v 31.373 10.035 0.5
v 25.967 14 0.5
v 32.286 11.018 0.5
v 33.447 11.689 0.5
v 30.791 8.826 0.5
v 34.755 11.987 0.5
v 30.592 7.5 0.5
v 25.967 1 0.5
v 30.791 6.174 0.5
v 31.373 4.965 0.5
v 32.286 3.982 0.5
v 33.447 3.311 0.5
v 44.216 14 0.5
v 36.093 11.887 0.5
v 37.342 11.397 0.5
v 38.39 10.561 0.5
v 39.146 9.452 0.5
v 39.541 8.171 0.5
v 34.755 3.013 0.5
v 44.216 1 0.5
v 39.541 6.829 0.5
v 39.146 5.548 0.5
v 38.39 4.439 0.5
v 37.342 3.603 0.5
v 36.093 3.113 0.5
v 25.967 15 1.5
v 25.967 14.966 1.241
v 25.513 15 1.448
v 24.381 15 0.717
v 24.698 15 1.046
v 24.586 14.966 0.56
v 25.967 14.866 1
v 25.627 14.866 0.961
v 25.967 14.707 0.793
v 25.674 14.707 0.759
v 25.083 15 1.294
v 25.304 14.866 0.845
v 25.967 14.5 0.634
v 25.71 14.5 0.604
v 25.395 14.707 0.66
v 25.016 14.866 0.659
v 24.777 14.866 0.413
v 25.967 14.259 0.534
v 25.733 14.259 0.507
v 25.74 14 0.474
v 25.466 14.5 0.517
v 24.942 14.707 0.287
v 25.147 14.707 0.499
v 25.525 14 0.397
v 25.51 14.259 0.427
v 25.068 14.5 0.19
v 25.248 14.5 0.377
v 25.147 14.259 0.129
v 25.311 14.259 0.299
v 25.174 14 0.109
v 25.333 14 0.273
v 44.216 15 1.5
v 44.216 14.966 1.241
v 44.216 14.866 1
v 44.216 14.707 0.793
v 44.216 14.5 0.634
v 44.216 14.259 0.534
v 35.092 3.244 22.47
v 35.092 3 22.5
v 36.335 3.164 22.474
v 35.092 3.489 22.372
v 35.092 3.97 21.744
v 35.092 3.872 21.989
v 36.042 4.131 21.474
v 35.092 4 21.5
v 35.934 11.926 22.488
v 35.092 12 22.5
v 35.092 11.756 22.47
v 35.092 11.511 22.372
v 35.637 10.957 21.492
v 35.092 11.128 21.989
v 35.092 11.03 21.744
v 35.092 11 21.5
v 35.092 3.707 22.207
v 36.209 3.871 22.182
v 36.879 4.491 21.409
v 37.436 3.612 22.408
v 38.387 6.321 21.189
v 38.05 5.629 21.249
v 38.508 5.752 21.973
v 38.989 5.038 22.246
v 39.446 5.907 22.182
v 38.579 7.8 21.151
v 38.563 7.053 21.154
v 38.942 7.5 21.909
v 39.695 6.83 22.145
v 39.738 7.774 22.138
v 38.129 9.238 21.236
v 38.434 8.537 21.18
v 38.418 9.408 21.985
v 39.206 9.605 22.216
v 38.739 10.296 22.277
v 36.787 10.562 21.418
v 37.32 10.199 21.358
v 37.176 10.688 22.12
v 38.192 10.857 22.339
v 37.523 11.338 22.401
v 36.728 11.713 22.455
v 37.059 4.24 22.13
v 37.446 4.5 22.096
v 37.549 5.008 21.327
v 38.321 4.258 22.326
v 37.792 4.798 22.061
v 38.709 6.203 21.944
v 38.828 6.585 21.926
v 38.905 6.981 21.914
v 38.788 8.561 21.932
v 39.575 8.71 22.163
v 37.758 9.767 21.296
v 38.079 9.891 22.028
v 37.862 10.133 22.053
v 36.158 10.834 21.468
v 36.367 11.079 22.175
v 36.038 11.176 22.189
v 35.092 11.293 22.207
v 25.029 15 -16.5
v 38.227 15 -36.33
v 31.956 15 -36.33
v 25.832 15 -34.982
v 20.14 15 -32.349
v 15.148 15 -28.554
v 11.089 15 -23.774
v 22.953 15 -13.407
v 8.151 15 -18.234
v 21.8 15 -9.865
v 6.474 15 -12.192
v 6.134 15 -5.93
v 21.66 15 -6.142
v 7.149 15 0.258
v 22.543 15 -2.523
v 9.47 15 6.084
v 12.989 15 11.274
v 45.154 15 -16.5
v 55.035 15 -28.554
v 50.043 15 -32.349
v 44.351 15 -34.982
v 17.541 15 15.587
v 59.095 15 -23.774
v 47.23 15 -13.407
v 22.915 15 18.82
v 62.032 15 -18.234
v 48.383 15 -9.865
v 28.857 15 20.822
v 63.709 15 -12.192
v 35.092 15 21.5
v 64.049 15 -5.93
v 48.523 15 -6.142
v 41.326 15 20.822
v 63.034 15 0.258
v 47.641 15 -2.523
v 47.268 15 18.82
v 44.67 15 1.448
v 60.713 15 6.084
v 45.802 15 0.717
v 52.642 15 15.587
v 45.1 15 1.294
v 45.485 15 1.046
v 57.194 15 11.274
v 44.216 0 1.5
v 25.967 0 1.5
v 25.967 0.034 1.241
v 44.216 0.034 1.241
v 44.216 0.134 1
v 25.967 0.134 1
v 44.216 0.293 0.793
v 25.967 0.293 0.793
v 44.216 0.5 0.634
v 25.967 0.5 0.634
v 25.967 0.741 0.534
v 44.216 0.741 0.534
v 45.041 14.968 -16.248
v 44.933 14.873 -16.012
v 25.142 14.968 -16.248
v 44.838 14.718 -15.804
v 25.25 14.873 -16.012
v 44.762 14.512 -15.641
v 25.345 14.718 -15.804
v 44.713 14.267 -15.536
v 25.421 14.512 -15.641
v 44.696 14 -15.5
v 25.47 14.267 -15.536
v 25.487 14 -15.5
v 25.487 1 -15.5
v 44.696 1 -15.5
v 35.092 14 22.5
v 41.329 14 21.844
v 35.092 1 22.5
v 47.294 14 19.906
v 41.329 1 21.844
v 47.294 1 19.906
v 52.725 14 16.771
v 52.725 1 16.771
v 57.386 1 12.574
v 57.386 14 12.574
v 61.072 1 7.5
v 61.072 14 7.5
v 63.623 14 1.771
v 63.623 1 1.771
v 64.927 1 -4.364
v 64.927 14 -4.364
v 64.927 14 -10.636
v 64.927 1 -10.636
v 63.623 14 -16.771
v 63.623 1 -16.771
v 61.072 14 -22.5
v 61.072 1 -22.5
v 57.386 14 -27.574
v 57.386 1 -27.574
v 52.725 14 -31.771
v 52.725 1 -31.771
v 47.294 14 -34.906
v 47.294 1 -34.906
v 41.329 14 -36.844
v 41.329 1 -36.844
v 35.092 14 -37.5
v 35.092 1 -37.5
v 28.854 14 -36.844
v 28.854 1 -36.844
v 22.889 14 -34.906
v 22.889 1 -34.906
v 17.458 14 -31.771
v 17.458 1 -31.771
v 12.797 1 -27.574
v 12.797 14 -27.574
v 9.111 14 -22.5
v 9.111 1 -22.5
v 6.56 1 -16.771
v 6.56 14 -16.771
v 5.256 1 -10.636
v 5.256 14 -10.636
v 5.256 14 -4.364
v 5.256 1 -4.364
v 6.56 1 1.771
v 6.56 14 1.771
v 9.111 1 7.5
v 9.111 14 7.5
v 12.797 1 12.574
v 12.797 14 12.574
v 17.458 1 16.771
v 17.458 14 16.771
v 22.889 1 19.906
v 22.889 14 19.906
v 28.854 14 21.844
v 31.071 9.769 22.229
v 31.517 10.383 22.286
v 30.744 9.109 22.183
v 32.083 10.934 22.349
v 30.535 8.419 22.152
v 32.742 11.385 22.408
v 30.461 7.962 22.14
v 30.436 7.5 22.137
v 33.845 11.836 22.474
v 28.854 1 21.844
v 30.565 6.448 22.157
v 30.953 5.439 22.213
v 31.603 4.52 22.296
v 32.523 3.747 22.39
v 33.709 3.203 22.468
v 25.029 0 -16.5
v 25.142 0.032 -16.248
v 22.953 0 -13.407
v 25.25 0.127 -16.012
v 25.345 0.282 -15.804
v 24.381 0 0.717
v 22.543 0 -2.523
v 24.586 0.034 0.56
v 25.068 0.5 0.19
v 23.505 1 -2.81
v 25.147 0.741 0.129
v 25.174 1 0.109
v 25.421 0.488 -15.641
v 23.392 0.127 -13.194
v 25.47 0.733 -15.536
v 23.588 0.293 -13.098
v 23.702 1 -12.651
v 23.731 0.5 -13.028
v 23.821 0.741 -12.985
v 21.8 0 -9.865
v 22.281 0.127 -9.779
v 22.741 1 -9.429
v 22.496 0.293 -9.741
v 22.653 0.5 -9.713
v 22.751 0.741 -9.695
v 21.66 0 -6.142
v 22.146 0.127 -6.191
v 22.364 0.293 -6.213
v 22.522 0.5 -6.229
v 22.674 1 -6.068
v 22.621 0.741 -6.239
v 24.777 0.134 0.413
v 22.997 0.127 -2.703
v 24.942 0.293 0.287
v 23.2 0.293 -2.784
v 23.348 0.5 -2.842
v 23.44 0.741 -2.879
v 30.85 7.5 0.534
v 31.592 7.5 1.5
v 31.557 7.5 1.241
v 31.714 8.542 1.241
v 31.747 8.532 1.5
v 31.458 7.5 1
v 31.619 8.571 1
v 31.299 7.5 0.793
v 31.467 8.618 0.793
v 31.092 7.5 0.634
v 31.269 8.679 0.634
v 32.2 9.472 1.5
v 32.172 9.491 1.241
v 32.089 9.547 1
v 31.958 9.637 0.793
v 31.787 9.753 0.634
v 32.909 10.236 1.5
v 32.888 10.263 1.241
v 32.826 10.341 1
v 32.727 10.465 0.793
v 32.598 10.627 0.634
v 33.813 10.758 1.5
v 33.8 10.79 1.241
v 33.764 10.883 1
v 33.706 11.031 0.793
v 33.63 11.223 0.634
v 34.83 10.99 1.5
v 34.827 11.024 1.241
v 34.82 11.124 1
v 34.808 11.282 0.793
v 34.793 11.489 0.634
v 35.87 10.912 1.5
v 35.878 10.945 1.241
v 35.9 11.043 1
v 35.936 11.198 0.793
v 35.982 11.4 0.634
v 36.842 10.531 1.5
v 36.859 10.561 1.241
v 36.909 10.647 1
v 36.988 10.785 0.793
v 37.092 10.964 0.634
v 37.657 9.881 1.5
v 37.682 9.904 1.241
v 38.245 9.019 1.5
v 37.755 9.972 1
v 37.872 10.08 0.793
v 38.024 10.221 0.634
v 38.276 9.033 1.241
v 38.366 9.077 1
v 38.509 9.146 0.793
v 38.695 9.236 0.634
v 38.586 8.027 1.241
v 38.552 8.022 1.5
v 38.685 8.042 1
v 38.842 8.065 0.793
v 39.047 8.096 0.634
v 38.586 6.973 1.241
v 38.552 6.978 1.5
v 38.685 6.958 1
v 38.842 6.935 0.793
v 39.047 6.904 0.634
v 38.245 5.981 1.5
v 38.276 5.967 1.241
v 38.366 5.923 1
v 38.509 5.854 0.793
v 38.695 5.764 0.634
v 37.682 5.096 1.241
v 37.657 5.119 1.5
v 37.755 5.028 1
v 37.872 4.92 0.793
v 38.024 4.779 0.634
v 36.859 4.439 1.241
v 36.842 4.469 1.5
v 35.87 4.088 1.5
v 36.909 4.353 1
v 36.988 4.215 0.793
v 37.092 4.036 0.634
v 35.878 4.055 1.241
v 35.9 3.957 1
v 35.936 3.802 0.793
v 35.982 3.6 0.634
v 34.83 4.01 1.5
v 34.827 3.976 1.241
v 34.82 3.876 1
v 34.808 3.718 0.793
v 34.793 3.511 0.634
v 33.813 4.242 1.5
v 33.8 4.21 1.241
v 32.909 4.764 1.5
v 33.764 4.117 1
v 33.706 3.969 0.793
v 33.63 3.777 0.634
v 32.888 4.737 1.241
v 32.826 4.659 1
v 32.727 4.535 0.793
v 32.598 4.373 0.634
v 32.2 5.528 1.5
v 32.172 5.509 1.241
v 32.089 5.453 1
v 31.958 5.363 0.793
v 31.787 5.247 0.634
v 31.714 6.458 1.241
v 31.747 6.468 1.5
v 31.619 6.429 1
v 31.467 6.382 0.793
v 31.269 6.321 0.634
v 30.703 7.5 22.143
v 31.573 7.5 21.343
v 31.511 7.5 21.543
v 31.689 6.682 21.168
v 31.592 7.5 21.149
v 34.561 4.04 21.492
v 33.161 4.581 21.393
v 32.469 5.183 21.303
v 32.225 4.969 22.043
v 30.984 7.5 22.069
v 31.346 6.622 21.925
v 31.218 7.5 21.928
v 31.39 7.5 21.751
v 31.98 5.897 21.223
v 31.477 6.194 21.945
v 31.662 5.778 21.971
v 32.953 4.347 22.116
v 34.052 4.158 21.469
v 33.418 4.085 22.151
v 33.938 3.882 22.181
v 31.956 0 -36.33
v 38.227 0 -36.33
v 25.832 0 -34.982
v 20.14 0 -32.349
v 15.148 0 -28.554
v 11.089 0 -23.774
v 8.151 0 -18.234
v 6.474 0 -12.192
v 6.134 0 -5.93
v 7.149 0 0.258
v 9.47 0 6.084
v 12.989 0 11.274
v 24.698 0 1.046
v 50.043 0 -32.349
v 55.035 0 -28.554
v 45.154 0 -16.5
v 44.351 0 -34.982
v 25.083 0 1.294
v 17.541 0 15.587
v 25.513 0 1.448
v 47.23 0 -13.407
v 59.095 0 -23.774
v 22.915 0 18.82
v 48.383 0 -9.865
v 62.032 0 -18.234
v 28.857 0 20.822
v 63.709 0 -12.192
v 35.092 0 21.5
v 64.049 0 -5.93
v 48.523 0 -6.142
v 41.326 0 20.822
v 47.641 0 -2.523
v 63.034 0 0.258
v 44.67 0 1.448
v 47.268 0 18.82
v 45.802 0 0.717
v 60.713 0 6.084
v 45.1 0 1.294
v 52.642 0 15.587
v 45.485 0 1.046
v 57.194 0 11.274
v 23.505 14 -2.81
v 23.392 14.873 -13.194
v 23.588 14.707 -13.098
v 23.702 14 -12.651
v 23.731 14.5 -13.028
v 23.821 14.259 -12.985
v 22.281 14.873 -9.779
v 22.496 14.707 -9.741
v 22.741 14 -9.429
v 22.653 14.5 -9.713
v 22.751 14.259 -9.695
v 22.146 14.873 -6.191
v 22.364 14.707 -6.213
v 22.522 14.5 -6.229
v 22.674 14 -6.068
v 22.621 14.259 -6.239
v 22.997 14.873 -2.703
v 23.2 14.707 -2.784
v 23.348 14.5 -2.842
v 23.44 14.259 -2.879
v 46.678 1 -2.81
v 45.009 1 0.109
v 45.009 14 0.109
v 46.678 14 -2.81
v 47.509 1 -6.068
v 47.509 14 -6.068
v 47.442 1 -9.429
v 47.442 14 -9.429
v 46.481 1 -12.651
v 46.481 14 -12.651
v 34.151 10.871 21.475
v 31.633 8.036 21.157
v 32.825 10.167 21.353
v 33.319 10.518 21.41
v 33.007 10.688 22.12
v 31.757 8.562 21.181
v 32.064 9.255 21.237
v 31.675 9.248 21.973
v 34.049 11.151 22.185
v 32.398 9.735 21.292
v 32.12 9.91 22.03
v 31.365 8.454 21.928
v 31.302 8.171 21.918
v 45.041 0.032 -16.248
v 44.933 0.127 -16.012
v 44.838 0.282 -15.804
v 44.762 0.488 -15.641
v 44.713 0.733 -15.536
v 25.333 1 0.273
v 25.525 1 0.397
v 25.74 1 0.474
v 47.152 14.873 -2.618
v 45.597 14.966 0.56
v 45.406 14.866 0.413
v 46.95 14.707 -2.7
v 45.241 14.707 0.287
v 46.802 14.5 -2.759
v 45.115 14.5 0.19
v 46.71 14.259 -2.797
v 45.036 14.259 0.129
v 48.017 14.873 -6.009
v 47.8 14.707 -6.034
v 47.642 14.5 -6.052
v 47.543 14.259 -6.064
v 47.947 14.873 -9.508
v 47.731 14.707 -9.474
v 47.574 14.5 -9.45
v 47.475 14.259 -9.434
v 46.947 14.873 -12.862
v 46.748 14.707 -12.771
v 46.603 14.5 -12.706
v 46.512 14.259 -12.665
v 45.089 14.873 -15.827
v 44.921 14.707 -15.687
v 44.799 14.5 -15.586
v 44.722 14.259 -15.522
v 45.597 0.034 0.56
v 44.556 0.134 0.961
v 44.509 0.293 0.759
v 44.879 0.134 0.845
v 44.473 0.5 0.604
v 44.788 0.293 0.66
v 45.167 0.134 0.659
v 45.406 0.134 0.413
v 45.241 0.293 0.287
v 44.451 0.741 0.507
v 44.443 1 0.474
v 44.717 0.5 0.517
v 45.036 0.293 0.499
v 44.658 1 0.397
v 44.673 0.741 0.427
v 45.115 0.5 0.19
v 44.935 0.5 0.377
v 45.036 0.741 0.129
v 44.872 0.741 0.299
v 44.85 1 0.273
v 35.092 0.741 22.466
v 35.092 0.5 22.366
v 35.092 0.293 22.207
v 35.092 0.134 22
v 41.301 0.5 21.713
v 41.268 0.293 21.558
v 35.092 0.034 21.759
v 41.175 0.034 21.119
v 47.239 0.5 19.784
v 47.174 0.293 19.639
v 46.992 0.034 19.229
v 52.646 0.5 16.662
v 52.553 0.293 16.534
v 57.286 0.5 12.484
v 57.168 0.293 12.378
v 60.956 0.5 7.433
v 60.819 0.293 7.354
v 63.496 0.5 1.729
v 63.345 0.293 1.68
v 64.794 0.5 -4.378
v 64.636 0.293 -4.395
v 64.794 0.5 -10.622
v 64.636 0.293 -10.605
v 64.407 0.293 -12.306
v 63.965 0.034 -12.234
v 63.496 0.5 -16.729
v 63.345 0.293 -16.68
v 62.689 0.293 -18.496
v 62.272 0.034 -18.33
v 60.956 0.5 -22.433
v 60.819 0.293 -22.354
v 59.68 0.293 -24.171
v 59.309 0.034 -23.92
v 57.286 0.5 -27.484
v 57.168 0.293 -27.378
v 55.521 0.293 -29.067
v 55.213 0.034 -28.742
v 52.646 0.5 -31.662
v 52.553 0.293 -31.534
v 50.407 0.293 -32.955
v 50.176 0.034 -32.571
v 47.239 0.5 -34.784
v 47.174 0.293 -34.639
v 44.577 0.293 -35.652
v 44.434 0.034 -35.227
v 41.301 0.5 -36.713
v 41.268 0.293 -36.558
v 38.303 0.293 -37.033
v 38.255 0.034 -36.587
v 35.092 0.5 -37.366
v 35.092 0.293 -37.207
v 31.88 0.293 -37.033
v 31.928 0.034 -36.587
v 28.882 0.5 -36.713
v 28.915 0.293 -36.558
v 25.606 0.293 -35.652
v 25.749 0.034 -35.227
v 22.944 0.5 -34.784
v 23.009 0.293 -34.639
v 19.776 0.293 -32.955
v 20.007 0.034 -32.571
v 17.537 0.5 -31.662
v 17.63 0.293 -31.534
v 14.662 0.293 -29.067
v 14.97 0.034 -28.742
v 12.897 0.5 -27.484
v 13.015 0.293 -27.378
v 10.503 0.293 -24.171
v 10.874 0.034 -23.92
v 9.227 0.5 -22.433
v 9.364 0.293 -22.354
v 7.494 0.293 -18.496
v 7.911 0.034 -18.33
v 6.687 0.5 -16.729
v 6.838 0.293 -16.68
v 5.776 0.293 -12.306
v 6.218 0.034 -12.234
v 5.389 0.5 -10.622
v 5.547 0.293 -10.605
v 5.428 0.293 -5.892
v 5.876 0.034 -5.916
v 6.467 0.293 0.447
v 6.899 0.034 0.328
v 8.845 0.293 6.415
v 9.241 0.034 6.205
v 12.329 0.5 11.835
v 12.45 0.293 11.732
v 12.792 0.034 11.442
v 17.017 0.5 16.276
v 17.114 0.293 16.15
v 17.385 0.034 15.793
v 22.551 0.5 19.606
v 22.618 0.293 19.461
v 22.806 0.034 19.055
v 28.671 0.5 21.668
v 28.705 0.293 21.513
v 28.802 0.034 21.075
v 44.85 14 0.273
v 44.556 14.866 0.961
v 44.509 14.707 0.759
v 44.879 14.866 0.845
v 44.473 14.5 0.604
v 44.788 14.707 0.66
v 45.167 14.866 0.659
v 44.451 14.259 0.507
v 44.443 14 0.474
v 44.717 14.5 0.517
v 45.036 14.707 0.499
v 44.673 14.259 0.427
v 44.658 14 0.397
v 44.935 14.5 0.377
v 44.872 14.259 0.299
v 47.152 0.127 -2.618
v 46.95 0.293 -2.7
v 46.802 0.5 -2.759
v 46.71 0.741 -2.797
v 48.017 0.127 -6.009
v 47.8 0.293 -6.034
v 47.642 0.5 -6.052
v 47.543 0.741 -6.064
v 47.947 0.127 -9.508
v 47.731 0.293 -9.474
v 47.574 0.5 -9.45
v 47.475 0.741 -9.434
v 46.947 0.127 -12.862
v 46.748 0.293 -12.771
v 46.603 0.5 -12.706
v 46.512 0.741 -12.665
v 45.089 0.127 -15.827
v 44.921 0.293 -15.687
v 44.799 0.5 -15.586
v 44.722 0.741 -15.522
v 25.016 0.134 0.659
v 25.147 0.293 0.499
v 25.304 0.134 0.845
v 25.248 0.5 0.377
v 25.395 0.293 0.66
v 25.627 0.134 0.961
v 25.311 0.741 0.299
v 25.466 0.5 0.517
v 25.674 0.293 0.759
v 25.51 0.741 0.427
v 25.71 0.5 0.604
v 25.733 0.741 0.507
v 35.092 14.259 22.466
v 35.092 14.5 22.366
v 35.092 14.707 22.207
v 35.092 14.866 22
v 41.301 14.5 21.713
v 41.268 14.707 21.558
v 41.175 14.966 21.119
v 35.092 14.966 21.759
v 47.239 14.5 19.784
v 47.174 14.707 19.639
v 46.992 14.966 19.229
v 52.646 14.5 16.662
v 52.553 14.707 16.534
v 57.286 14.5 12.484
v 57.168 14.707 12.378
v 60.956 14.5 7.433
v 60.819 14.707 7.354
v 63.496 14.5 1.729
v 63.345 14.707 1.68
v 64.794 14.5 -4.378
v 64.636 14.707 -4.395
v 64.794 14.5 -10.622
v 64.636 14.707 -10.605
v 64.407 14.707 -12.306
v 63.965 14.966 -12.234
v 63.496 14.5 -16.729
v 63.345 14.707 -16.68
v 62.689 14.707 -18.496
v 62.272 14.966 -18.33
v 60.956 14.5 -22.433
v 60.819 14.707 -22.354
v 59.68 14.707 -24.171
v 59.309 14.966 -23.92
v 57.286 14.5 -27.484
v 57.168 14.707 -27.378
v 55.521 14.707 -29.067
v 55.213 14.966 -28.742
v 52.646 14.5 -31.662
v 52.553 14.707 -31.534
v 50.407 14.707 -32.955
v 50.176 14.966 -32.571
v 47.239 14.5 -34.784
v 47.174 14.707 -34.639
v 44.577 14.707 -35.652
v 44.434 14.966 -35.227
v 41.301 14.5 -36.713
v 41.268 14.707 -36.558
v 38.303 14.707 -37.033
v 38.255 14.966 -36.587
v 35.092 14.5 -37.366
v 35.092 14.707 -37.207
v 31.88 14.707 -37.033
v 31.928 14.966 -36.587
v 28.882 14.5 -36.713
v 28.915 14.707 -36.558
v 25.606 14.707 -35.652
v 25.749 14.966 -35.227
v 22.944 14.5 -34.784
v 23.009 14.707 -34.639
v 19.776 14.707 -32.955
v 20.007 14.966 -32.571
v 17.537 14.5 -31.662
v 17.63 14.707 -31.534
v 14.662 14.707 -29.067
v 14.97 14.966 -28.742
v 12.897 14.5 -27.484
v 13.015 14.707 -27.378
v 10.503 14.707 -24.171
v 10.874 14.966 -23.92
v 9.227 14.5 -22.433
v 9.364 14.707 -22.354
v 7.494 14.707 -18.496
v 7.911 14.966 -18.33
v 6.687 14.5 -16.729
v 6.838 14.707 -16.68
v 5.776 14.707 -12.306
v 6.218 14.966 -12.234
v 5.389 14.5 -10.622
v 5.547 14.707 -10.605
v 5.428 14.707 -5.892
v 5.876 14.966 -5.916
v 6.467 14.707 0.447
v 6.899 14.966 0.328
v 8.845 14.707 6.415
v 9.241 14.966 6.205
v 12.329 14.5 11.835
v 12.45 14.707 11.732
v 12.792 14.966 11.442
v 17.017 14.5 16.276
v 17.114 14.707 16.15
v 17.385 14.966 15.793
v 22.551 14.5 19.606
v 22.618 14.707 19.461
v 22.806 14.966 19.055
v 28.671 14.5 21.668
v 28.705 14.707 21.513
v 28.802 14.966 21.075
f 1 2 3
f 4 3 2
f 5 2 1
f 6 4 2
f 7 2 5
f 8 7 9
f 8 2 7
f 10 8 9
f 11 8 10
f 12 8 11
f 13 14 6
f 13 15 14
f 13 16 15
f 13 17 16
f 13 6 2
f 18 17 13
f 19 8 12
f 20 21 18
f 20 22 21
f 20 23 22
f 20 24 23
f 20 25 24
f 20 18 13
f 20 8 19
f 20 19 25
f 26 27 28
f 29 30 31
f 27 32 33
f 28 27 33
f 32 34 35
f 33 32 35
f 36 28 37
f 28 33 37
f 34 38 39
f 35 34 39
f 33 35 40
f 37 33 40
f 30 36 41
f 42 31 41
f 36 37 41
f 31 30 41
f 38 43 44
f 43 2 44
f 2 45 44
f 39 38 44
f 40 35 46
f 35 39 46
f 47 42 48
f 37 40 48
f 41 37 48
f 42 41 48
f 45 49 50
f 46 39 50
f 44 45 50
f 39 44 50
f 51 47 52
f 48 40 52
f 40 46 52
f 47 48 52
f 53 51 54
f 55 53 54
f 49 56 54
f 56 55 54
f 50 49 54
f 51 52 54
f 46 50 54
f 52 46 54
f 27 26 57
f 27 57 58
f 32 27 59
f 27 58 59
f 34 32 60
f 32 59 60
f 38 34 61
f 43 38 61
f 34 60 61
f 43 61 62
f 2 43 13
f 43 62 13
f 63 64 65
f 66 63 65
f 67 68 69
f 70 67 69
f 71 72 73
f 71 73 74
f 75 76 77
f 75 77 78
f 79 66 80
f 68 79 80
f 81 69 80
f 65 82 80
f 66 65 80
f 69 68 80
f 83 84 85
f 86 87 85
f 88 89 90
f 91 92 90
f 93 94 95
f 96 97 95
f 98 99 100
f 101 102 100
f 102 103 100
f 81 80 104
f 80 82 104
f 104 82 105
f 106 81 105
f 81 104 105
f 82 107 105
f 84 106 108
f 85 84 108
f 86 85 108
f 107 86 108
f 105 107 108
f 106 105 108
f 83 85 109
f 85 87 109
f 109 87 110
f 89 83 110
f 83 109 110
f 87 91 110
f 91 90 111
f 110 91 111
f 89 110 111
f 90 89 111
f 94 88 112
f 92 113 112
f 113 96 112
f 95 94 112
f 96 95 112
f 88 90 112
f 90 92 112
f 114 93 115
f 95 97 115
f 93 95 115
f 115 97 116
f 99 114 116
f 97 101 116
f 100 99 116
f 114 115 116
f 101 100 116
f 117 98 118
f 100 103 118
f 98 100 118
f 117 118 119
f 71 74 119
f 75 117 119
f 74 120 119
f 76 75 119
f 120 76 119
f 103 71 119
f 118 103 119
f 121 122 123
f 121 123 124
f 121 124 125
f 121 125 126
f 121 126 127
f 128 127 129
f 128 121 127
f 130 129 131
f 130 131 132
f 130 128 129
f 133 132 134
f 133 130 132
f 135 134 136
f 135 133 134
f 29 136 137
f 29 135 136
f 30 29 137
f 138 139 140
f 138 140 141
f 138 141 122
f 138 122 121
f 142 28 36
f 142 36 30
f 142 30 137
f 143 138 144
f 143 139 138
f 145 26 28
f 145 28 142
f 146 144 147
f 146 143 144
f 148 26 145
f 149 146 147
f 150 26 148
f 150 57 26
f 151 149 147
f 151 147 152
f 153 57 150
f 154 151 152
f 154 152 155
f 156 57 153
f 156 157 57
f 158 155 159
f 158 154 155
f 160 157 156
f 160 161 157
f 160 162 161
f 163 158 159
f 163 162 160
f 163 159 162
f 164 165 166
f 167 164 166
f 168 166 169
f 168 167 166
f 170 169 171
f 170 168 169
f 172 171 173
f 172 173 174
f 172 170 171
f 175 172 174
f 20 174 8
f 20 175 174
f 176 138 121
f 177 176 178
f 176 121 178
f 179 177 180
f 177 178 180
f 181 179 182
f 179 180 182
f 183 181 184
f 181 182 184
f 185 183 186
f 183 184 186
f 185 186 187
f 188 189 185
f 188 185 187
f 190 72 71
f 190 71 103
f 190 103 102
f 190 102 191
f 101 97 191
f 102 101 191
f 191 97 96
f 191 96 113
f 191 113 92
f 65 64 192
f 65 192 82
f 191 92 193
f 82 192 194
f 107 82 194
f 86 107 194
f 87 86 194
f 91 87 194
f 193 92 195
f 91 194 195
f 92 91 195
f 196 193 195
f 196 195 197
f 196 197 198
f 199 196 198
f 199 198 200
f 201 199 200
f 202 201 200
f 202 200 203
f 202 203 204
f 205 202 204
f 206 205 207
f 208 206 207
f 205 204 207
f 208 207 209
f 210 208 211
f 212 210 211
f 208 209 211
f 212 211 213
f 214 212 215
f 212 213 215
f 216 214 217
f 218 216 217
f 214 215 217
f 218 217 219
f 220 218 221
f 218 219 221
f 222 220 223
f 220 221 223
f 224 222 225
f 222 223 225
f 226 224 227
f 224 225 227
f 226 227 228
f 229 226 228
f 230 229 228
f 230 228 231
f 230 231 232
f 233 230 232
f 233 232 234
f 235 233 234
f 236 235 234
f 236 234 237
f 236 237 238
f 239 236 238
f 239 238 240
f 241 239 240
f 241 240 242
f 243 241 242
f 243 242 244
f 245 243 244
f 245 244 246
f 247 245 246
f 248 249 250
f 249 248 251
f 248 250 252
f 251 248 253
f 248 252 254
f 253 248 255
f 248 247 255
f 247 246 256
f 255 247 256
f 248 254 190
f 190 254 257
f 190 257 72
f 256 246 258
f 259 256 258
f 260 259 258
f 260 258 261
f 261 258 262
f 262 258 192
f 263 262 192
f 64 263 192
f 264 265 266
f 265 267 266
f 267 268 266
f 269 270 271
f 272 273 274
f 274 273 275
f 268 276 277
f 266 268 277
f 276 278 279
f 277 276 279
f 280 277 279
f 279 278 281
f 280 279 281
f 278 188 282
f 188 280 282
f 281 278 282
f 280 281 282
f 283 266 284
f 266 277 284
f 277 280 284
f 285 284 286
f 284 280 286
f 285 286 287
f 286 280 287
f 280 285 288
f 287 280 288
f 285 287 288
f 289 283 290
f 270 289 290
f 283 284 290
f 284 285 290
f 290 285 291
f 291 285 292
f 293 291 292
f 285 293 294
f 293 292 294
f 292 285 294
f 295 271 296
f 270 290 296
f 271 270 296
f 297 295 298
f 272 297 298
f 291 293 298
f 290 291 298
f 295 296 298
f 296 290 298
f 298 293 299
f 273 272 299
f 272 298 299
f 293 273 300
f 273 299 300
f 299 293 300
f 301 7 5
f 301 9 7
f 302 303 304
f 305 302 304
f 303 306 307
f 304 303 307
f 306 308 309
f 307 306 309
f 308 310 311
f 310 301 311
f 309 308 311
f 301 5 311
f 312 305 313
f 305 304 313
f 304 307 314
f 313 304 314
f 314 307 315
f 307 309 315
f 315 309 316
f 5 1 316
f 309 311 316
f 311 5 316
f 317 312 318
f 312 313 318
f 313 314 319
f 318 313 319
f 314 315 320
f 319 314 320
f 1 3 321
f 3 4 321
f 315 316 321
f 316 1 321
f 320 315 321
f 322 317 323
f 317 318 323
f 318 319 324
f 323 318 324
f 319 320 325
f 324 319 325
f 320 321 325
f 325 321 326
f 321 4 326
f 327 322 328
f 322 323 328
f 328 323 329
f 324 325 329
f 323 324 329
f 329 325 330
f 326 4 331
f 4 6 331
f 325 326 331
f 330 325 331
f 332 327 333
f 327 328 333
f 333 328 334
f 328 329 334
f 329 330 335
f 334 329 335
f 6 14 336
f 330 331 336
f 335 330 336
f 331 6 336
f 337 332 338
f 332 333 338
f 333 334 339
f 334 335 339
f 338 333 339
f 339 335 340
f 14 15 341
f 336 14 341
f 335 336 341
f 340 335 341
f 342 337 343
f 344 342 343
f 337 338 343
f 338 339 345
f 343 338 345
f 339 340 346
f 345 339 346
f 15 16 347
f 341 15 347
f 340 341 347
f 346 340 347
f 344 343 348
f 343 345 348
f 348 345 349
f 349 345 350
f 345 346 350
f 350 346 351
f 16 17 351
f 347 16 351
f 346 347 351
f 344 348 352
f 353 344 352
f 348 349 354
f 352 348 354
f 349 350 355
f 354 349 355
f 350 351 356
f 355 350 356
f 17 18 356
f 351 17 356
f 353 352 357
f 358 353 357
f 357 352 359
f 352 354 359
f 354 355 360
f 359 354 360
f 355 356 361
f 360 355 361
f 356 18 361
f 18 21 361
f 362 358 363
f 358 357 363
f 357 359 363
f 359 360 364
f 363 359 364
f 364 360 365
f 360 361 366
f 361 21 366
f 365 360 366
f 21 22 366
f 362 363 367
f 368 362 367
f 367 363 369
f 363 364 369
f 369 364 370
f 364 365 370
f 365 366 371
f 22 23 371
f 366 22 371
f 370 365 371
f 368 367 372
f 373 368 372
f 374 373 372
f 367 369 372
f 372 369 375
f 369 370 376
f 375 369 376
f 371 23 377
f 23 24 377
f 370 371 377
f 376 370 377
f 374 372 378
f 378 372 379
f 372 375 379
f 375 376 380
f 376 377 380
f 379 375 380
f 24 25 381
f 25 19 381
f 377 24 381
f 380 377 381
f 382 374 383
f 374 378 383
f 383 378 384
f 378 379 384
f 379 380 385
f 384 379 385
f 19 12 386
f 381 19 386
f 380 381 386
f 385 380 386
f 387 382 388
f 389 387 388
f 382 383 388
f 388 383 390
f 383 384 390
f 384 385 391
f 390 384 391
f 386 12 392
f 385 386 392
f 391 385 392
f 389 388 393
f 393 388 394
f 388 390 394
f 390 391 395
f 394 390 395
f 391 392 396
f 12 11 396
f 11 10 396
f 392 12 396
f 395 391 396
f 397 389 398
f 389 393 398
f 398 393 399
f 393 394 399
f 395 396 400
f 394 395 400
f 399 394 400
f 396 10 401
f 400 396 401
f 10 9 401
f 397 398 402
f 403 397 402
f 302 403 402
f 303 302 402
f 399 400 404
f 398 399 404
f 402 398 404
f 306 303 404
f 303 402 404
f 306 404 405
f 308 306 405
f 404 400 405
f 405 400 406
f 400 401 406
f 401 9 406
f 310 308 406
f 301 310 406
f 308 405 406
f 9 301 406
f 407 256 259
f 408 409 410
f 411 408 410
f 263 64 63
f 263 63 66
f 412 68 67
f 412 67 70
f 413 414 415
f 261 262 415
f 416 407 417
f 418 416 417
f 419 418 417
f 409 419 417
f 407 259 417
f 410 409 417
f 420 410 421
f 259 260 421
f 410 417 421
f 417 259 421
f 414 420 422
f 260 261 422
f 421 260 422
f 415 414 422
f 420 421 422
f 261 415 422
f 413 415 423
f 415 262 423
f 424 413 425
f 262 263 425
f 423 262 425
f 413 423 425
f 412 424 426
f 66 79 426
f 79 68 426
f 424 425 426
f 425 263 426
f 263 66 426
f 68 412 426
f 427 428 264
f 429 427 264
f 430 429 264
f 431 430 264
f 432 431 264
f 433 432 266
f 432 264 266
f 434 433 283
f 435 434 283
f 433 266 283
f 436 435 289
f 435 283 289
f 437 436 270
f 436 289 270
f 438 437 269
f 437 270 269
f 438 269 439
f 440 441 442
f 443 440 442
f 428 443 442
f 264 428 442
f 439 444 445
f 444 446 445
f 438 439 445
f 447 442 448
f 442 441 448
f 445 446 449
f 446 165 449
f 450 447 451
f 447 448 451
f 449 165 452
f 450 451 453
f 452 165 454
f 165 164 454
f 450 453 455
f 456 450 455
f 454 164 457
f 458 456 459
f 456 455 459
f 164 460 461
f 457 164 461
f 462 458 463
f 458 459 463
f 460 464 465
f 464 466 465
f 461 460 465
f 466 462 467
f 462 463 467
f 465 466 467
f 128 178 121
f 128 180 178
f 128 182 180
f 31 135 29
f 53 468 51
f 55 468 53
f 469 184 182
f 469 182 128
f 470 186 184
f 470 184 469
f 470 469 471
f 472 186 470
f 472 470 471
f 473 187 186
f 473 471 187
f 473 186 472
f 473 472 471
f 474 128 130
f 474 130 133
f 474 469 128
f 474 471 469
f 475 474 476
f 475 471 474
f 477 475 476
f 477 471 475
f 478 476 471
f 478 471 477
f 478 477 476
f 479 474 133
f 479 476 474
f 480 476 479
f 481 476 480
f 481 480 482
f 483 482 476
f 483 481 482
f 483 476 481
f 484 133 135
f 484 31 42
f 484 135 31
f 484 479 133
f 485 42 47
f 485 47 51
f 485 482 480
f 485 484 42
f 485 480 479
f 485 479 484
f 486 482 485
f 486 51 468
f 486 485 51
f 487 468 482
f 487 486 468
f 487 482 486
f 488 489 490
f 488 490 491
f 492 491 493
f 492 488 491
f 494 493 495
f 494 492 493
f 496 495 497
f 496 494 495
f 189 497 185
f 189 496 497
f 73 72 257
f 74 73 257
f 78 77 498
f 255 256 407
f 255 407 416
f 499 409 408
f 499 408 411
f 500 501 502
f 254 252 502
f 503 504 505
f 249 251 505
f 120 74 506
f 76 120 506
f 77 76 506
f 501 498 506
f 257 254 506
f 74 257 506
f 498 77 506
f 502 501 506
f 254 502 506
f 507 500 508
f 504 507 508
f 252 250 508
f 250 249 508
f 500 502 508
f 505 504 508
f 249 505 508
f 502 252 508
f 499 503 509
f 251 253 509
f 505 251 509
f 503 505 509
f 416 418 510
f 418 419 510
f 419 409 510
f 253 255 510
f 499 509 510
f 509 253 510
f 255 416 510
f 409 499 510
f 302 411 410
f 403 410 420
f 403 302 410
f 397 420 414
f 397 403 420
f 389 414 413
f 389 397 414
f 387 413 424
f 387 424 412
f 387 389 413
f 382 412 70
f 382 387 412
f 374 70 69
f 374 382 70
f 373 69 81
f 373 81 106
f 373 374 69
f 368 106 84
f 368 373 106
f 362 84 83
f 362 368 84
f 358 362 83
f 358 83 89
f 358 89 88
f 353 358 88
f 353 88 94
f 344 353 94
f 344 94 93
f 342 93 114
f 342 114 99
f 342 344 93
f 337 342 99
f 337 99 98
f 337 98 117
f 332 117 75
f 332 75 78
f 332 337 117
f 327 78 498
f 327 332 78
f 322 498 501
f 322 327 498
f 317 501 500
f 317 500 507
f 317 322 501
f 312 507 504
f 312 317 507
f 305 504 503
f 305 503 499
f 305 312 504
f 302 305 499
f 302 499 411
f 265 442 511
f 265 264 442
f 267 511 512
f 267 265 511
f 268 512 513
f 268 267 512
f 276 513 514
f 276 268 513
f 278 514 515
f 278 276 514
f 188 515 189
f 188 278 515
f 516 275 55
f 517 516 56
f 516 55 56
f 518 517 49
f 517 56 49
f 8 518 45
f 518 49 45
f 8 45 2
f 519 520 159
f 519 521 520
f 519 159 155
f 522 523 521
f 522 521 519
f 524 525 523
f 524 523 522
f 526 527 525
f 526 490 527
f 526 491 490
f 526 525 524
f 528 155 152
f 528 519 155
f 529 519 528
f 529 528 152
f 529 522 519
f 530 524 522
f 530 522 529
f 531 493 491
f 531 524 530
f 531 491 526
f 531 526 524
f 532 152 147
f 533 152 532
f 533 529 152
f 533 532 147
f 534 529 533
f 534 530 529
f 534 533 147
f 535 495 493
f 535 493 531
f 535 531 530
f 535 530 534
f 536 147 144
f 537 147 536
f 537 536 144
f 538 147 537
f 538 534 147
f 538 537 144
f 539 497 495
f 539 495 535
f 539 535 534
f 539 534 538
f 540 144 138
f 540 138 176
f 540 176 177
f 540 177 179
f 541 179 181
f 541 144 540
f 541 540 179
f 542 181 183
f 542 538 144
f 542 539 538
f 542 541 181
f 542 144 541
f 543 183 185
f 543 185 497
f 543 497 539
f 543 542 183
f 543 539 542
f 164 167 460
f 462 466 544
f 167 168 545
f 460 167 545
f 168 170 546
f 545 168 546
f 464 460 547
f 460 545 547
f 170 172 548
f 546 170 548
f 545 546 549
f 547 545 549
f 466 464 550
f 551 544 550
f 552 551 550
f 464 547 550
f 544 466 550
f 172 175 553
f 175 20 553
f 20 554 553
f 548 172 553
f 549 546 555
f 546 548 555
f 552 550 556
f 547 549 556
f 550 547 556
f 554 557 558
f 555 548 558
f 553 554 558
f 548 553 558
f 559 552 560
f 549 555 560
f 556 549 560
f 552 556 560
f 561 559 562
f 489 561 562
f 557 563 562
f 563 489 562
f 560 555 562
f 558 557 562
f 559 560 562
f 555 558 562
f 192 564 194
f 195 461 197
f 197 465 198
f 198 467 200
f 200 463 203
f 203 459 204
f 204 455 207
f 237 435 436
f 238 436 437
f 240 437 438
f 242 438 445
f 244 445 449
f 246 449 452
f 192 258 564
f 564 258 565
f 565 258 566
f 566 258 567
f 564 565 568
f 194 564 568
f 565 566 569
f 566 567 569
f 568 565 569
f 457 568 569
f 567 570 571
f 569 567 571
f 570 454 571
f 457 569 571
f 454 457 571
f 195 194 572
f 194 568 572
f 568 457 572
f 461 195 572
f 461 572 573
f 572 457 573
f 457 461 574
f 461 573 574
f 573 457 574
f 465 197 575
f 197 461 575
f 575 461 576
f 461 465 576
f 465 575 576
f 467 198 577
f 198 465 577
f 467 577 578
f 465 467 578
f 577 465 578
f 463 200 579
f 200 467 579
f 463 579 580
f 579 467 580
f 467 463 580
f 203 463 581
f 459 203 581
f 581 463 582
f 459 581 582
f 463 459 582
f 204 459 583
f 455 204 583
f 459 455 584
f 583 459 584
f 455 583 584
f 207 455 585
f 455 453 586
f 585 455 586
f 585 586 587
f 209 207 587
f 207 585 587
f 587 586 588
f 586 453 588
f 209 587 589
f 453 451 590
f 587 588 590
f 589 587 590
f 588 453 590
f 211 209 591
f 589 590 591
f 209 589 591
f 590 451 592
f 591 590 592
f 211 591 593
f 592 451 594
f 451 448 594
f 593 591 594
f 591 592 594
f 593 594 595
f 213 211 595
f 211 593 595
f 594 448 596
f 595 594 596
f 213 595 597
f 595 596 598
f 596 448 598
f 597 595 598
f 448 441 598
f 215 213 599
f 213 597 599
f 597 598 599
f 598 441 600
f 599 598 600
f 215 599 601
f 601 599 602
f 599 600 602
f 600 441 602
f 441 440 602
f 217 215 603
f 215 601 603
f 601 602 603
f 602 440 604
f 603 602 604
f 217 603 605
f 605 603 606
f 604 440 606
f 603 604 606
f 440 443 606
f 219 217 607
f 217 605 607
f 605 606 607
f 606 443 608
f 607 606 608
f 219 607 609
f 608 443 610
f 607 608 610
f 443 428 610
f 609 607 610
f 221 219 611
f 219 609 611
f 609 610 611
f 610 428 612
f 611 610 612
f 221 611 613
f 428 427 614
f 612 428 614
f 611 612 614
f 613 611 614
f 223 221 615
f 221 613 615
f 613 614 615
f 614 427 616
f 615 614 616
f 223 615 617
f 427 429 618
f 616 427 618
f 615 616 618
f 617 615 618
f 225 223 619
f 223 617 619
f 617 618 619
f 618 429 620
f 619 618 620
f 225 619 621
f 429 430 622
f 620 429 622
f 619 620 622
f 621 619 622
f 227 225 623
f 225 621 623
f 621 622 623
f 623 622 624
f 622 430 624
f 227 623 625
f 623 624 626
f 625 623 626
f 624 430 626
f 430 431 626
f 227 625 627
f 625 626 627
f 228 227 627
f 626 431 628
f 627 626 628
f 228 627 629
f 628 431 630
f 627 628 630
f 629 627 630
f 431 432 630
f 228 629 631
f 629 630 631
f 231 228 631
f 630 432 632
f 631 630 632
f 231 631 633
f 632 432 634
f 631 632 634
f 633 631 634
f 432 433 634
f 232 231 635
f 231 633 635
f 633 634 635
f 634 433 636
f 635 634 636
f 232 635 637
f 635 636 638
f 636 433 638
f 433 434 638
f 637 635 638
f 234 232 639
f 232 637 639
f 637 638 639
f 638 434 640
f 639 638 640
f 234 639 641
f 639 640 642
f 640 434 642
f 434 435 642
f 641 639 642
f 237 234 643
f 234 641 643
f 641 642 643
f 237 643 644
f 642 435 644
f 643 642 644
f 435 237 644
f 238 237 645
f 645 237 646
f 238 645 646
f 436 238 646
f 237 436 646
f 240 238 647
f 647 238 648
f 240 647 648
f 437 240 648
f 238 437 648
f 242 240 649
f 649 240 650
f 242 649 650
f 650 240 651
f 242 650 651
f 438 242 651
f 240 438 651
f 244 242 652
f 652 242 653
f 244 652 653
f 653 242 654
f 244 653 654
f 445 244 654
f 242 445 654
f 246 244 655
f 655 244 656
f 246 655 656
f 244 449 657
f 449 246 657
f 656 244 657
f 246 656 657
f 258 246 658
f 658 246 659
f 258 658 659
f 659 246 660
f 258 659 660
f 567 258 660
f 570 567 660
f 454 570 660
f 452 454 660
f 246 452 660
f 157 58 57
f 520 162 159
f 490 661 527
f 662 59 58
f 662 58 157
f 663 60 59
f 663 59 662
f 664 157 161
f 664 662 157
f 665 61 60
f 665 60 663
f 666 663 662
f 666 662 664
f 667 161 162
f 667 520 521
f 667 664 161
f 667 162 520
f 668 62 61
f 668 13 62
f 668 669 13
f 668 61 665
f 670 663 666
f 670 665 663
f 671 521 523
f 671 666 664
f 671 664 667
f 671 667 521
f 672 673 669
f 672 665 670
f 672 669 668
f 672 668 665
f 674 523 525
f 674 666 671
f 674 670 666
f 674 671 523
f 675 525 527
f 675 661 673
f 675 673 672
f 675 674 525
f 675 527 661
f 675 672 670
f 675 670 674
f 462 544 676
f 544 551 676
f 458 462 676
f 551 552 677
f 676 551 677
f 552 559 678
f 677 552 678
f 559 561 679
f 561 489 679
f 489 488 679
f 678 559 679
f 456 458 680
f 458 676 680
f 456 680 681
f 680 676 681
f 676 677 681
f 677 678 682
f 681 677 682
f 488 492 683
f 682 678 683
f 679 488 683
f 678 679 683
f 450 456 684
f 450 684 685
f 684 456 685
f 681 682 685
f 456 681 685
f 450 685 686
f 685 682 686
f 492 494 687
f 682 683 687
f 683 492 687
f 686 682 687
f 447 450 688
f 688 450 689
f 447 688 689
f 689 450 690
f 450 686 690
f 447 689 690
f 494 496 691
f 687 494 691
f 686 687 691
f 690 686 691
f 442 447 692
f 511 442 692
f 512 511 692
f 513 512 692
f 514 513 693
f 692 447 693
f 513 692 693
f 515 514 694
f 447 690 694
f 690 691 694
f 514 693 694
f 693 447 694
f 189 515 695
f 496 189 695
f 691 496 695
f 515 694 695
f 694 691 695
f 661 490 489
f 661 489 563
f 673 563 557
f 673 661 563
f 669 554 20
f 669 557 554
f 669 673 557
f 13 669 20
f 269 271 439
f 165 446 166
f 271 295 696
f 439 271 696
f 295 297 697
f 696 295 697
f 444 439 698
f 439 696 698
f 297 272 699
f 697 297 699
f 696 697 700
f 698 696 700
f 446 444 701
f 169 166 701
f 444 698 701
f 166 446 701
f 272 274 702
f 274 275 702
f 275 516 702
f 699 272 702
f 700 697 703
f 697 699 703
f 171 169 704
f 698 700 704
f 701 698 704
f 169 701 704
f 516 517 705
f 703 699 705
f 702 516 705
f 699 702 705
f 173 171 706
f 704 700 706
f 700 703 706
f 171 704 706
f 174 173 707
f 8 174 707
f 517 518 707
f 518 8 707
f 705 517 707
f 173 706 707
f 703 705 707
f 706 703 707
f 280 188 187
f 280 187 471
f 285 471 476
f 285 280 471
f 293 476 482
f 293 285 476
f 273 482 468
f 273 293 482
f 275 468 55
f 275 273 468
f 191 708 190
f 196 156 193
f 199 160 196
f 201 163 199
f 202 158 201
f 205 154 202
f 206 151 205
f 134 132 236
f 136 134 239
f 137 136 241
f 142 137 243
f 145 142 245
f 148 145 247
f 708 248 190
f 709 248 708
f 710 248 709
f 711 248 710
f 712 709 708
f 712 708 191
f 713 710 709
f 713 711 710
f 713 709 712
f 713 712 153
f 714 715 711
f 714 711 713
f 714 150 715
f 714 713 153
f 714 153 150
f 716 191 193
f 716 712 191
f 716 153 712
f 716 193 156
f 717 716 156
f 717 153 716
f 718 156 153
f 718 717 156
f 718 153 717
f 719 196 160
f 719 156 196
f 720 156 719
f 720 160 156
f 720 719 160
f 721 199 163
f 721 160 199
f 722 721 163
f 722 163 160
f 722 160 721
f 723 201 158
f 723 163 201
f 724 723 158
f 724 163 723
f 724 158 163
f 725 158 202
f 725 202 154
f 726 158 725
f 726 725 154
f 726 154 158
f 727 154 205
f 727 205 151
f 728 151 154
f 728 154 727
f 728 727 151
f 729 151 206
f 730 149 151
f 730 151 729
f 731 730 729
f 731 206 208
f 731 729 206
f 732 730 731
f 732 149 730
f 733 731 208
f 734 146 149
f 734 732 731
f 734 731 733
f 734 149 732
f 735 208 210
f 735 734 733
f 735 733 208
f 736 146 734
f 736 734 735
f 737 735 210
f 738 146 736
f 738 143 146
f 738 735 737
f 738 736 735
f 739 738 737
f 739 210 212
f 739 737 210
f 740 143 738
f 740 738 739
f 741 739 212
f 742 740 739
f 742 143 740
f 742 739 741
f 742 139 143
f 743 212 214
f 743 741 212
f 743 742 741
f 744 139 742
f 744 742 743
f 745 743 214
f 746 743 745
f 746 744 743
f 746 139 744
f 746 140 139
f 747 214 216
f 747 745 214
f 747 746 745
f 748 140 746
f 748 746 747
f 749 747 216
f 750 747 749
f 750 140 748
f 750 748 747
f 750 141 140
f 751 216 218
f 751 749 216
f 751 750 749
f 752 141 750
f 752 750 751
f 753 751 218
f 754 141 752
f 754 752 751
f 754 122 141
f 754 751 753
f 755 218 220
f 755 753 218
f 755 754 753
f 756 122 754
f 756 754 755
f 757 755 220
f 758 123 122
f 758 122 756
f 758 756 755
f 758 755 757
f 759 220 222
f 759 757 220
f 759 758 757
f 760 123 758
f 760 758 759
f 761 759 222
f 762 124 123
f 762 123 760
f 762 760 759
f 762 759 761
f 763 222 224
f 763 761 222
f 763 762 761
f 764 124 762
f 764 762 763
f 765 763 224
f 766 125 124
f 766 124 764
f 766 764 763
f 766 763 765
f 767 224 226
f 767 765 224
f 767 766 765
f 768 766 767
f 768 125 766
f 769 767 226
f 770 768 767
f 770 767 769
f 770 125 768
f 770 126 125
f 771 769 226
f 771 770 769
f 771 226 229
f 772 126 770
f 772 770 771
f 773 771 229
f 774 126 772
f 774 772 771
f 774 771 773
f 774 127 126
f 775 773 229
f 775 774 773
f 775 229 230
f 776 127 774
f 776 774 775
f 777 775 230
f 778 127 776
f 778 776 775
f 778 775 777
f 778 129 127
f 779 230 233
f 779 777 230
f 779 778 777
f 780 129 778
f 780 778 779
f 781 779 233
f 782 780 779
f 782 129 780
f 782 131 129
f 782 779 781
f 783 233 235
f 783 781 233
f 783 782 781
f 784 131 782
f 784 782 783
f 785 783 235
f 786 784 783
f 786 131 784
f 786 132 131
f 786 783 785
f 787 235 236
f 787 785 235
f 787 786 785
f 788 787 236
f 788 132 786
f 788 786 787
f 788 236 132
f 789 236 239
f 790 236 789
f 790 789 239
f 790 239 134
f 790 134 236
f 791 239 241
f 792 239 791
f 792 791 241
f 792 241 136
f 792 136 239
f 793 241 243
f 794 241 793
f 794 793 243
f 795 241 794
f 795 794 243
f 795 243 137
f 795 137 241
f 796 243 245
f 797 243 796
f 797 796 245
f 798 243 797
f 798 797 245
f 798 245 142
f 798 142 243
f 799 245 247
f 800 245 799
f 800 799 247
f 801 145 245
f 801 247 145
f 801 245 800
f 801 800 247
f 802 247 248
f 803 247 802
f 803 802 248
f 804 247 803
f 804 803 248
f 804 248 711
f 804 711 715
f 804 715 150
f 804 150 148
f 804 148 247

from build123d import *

# Parameters (mm, degrees)
SKETCH2_R           = 30
BOSS_EXTRUDE1_DEPTH = 15
SKETCH4_R           = 3.5
CUT_EXTRUDE1_DEPTH  = 25
FILLET1_R           = 1


with BuildPart() as part:
    # Sketch2 → Boss-Extrude1 (new body)
    with BuildSketch(Plane(origin=(0, 0, 0), x_dir=(1, 0, 0), z_dir=(0, 1, 0))):
        with Locations(Location((35.09152354, 7.5, 0), (0, 0, 270))):
            Circle(SKETCH2_R)
        with BuildLine():
            Line((35.09152354, -0.5), (44.696209896, -0.5))
            ThreePointArc((44.696209896, -0.5), (47.59152354, 7.5), (44.696209896, 15.5))
            Line((44.696209896, 15.5), (35.09152354, 15.5))
            Line((35.09152354, 15.5), (25.486837184, 15.5))
            ThreePointArc((25.486837184, 15.5), (22.59152354, 7.5), (25.486837184, -0.5))
            Line((25.486837184, -0.5), (35.09152354, -0.5))
        make_face(mode=Mode.SUBTRACT)
    extrude(amount=BOSS_EXTRUDE1_DEPTH)

    # Sketch4 → Cut-Extrude1 (cut)
    with BuildSketch(Plane.XY):
        with Locations(Location((35.09152354, 7.5, 0), (0, 0, 180))):
            Circle(SKETCH4_R)
    extrude(amount=CUT_EXTRUDE1_DEPTH, mode=Mode.SUBTRACT)

    # Fillet1
    fillet1_edges = [part.edges().sort_by_distance(p)[0] for p in [
        (35.09152354, 15, 0.5),
        (47.59152354, 15, -7.5),
        (22.59152354, 15, -7.5),
        (35.09152354, 0, -15.5),
        (35.09152354, 0, -37.5),
        (38.59152354, 7.5, 0.5),
        (38.59152354, 7.5, 22.295133831),
        (35.09152354, 15, -37.5),
        (35.09152354, 0, 0.5),
        (25.486837184, 7.5, 0.5),
        (47.59152354, 0, -7.5),
        (44.696209896, 7.5, 0.5),
        (35.09152354, 15, -15.5),
        (22.59152354, 0, -7.5),
    ]]
    fillet(fillet1_edges, radius=FILLET1_R)


solid = part.part
